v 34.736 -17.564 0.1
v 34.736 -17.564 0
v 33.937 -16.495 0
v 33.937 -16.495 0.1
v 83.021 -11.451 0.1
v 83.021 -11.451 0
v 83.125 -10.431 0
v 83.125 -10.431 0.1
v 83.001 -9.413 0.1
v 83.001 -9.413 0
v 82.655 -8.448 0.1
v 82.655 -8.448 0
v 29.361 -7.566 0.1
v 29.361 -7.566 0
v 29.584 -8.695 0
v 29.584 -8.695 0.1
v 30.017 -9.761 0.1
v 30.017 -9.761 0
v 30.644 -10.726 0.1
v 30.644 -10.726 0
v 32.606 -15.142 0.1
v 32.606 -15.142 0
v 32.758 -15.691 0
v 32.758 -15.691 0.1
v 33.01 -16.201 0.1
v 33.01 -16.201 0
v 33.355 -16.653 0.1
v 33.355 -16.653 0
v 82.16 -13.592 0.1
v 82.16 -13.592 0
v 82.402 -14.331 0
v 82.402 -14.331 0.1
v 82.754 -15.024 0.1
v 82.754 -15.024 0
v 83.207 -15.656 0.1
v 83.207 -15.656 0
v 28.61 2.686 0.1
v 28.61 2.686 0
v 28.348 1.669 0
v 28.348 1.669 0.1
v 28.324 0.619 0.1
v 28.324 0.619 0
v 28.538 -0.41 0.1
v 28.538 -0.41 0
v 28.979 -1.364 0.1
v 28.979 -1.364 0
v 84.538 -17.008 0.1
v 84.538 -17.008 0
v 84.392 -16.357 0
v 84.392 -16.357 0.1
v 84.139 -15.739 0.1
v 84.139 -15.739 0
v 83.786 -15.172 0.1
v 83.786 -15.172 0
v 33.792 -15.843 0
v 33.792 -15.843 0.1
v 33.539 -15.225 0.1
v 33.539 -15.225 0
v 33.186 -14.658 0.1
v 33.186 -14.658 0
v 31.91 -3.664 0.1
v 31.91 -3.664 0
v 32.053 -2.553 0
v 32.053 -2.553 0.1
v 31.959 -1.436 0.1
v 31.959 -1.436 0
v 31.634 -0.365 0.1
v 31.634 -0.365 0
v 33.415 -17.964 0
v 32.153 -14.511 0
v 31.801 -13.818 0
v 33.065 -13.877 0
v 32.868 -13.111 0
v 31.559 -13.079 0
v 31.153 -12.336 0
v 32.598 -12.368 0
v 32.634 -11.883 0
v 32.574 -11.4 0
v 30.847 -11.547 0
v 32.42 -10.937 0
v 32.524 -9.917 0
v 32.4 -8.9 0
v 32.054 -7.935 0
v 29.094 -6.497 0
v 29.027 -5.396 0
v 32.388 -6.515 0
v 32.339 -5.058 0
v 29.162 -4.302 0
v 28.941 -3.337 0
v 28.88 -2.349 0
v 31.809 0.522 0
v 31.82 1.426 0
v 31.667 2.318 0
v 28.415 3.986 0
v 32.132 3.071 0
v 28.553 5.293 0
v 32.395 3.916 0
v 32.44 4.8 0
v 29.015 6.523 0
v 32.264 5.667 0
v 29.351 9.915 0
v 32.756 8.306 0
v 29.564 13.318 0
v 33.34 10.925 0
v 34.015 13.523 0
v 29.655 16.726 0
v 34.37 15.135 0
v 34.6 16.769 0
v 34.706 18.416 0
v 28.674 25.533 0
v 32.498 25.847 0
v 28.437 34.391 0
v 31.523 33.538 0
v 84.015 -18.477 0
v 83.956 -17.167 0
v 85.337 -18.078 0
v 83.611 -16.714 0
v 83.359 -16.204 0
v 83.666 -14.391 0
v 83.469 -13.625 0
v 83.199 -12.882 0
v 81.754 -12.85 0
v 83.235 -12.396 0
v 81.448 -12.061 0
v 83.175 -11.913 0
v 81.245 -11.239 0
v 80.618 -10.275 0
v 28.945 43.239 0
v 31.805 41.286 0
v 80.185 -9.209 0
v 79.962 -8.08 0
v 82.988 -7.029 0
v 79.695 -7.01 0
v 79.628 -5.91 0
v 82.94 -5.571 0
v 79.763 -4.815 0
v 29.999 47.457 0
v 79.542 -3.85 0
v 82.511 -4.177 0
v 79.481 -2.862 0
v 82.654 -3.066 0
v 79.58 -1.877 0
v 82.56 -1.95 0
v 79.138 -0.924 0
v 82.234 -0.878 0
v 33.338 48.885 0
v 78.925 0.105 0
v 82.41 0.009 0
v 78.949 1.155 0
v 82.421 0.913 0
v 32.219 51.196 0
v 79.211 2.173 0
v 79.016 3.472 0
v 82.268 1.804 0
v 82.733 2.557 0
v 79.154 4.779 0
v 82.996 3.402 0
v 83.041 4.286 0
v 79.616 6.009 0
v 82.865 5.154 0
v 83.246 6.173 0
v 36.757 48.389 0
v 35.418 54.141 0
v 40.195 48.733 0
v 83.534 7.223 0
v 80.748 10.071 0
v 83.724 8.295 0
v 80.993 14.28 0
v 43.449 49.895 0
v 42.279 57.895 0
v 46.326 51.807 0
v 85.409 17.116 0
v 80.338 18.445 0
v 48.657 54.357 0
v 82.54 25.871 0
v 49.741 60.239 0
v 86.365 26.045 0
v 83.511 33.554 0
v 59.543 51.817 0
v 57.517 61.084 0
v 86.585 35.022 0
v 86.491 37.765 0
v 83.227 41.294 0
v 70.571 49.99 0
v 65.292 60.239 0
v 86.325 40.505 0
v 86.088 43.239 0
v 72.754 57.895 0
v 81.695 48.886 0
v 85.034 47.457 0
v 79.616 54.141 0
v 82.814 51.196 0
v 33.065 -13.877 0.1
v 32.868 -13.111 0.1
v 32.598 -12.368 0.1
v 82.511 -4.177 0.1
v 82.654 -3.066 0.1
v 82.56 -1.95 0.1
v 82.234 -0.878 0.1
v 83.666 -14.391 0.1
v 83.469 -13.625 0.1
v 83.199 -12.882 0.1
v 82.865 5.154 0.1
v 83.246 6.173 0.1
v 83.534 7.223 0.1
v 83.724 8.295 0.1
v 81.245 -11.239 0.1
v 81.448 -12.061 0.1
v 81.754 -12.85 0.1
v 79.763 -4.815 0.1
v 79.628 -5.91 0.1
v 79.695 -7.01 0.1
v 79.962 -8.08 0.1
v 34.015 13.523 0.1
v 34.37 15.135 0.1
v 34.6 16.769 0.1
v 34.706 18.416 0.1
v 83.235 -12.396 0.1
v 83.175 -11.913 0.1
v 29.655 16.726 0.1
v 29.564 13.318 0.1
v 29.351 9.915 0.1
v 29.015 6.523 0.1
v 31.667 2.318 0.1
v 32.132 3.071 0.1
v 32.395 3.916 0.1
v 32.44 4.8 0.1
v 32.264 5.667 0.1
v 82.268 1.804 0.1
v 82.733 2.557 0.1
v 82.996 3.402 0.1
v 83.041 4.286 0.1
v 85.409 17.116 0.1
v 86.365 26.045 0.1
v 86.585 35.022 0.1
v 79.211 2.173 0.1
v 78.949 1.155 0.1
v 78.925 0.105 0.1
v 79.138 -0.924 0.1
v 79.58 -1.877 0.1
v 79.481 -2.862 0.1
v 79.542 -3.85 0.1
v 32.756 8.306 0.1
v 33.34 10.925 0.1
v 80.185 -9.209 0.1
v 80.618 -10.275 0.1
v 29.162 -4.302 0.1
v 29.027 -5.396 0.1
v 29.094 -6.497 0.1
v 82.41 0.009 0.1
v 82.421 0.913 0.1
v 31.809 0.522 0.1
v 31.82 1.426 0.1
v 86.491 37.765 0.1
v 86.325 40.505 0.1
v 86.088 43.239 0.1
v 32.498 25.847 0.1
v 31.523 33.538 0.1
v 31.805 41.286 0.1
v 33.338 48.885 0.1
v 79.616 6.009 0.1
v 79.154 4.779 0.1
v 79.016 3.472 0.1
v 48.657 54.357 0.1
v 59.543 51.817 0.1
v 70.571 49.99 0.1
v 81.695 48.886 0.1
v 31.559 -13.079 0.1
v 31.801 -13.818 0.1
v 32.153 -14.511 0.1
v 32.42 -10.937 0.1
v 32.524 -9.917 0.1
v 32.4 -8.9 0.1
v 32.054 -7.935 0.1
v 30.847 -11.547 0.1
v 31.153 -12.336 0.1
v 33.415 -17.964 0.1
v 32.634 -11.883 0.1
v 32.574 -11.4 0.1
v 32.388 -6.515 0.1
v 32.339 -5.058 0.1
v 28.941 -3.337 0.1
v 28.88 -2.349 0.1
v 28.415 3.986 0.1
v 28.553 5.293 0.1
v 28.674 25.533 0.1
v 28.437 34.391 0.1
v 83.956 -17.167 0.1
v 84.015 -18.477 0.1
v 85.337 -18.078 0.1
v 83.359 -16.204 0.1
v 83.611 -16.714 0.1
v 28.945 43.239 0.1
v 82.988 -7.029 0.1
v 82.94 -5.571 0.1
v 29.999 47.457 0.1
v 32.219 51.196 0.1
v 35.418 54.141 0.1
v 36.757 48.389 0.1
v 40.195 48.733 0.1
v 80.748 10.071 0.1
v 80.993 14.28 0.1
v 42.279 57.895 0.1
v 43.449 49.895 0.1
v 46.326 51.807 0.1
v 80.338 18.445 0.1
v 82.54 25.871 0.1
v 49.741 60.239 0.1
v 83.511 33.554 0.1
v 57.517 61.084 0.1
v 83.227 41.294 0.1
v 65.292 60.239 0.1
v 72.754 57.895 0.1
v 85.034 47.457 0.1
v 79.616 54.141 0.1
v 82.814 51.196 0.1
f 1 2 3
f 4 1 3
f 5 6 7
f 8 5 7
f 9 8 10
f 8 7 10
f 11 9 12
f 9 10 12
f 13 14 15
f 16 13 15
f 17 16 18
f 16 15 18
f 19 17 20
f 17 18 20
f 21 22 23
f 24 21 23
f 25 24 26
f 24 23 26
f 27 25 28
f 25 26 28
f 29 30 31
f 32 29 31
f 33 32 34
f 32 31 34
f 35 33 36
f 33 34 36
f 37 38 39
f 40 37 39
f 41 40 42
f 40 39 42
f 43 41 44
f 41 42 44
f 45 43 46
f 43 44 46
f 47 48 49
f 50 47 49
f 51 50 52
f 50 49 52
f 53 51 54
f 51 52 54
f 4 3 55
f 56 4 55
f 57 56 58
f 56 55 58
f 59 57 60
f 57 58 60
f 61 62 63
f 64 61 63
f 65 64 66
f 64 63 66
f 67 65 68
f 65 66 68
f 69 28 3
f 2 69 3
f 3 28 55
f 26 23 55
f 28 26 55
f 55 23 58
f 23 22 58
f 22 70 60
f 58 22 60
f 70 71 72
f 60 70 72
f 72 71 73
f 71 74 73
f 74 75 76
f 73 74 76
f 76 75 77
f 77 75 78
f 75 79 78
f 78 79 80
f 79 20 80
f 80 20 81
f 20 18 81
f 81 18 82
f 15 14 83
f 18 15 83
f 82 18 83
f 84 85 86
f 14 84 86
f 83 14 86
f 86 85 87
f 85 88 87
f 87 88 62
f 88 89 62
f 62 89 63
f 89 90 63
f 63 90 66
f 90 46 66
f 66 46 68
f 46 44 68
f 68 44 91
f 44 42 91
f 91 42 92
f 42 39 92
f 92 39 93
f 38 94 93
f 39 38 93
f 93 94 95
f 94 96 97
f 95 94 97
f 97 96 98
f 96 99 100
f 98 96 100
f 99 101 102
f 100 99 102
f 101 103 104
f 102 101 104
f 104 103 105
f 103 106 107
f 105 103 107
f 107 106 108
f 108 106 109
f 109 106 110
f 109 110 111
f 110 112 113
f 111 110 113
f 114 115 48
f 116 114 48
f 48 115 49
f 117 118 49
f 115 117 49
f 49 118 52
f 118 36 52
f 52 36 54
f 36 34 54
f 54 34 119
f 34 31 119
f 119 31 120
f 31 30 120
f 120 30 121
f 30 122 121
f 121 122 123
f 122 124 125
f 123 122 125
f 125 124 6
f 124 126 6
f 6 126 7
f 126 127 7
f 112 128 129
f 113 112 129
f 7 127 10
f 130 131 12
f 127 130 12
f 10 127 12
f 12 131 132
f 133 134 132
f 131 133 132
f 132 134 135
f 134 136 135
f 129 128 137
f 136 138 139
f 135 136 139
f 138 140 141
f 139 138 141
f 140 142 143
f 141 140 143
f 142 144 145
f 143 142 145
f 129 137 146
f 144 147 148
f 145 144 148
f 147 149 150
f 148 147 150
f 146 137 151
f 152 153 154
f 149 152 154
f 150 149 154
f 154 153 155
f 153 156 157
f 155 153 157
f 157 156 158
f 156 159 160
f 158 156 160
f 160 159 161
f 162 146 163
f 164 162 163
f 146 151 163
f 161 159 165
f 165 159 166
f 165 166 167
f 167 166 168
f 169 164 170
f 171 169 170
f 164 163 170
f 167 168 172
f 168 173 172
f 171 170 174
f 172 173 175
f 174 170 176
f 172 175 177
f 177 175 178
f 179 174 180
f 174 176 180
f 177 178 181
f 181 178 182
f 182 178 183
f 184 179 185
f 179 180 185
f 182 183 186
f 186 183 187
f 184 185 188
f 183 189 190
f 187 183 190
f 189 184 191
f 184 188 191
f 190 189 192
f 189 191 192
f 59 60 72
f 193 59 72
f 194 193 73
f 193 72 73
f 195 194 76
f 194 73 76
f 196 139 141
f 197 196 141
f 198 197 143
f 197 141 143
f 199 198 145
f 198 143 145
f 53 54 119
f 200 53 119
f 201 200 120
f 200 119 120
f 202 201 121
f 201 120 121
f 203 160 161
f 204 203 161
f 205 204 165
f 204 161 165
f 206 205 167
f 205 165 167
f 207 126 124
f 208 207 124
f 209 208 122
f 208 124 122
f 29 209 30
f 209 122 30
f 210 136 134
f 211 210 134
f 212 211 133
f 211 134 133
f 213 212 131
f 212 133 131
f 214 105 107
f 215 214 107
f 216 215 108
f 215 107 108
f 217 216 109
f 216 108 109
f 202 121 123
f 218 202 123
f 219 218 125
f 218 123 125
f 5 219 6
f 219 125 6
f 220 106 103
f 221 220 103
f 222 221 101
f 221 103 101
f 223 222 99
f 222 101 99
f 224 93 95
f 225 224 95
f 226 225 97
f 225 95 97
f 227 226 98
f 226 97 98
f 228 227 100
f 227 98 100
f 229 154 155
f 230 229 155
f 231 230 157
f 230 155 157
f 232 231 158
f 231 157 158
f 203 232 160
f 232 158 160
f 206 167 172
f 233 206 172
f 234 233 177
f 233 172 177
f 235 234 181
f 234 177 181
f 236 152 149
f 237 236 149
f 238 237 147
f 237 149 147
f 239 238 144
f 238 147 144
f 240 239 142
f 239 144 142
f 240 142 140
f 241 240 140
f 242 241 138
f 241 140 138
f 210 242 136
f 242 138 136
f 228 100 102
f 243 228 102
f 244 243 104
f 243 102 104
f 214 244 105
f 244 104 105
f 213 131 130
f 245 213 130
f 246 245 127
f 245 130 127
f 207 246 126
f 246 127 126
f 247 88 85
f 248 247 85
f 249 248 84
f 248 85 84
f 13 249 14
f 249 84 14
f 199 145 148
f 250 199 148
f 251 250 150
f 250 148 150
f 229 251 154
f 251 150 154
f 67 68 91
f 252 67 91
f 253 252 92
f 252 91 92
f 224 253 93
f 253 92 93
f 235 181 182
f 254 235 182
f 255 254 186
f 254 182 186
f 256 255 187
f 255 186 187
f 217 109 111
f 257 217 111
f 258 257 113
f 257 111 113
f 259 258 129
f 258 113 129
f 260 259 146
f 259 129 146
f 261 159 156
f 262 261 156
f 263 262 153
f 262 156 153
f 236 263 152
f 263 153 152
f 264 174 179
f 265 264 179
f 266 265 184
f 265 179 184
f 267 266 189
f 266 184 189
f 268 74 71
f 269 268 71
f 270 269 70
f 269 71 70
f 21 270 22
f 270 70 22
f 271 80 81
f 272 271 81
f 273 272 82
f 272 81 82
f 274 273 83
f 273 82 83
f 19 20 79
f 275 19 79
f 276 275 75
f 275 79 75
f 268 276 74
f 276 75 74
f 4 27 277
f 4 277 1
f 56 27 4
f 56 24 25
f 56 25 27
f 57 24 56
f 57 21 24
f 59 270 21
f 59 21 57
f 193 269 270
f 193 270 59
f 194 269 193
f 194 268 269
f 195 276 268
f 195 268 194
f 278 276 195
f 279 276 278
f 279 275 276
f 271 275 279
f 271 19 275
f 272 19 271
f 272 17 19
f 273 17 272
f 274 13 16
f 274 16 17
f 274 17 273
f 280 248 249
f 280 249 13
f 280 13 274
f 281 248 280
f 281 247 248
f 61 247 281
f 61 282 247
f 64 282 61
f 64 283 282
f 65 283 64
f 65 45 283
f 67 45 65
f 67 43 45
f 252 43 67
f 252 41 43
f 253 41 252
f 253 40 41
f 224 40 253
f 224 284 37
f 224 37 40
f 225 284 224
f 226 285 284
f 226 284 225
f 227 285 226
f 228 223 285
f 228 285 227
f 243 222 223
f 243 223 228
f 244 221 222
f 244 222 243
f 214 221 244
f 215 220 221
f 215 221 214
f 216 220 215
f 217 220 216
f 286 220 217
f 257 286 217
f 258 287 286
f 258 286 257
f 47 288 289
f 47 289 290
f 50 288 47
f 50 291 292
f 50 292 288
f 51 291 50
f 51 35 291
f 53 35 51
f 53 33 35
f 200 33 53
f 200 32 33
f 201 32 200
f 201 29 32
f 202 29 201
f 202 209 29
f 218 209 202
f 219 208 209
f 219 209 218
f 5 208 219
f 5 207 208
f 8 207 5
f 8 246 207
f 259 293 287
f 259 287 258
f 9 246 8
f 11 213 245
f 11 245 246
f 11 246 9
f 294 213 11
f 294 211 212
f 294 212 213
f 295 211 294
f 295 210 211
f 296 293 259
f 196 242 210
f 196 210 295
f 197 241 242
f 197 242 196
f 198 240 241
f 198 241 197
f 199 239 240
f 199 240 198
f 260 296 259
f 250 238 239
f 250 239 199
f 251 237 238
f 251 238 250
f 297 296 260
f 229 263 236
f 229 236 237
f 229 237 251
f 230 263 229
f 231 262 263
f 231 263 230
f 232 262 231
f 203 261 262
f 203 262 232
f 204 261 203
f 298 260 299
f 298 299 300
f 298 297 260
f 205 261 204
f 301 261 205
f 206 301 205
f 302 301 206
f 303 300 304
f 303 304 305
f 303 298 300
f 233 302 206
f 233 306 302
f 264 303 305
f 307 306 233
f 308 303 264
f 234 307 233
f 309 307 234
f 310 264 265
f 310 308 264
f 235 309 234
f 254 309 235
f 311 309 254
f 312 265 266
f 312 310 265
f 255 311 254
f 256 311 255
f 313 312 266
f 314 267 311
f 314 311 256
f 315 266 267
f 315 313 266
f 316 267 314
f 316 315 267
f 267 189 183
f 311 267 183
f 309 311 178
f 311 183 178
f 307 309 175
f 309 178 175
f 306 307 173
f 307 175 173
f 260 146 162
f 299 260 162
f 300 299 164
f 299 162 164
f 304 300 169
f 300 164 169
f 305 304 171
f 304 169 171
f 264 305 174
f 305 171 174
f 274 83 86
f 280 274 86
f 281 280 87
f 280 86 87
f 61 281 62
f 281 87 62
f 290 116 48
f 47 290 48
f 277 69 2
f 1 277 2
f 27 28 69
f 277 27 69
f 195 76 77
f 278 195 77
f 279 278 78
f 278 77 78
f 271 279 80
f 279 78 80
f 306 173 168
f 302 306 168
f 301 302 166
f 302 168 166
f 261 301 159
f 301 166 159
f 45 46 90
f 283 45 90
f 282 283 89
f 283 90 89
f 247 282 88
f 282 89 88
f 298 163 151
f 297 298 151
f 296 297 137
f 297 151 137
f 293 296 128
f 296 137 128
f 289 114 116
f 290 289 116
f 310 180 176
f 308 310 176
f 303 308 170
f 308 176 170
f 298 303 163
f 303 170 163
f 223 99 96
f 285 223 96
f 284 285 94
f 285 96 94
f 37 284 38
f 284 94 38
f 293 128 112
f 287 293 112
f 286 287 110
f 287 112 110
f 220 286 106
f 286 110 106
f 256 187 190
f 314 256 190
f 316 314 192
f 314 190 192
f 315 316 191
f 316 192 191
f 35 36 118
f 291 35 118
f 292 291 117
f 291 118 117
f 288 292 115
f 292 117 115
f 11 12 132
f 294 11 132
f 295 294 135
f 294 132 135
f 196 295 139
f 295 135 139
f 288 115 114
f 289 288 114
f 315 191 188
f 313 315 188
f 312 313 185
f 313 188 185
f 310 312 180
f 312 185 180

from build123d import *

# Parameters (mm, degrees)
SALIENTE_EXTRUIR1_DEPTH = 0.1


with BuildPart() as part:
    # Model → Saliente-Extruir1 (new body)
    with BuildSketch(Plane.XY):
        with BuildLine():
            Line((83.956301506, -17.166999348), (84.015376633, -18.477240051))
            Line((84.015376633, -18.477240051), (85.336602283, -18.077638007))
            Line((85.336602283, -18.077638007), (84.538223467, -17.008293358))
            ThreePointArc((84.538223467, -17.008293358), (84.278969465, -16.042382101), (83.786477348, -15.171951914))
            ThreePointArc((83.786477348, -15.171951914), (83.576571308, -14.005422888), (83.198659759, -12.8820203))
            ThreePointArc((83.198659759, -12.8820203), (83.21653602, -12.153238047), (83.021147285, -11.450908798))
            ThreePointArc((83.021147285, -11.450908798), (83.091174716, -9.918606089), (82.654557847, -8.448156791))
            ThreePointArc((82.654557847, -8.448156791), (83.012265392, -6.298296984), (82.511107342, -4.177284848))
            ThreePointArc((82.511107342, -4.177284848), (82.63621748, -2.505599358), (82.234450021, -0.878095799))
            ThreePointArc((82.234450021, -0.878095799), (82.435913685, 0.460640045), (82.268030876, 1.804000246))
            ThreePointArc((82.268030876, 1.804000246), (82.996051805, 3.402356573), (82.865109648, 5.153816414))
            ThreePointArc((82.865109648, 5.153816414), (83.401985842, 6.694986621), (83.724308061, 8.294846004))
            ThreePointArc((83.724308061, 8.294846004), (85.978479306, 21.570456798), (86.584690484, 35.022432042))
            ThreePointArc((86.584690484, 35.022432042), (86.416684054, 39.135370857), (86.088155048, 43.23860867))
            ThreePointArc((86.088155048, 43.23860867), (84.060345255, 49.407216919), (79.615503089, 54.140832704))
            ThreePointArc((79.615503089, 54.140832704), (69.080555659, 59.249963441), (57.51663409, 61.084098716))
            ThreePointArc((57.51663409, 61.084098716), (45.952712521, 59.249963441), (35.417765091, 54.140832704))
            ThreePointArc((35.417765091, 54.140832704), (30.972922925, 49.407216919), (28.945113132, 43.23860867))
            ThreePointArc((28.945113132, 43.23860867), (28.46242928, 29.95974371), (29.654838805, 16.72571946))
            ThreePointArc((29.654838805, 16.72571946), (29.473058184, 11.615593771), (29.015376633, 6.522759949))
            ThreePointArc((29.015376633, 6.522759949), (28.442846773, 4.643578134), (28.610136964, 2.6862512))
            ThreePointArc((28.610136964, 2.6862512), (28.323722373, 0.618533481), (28.978689788, -1.363512826))
            ThreePointArc((28.978689788, -1.363512826), (28.890519119, -2.843965116), (29.162248311, -4.30193504))
            ThreePointArc((29.162248311, -4.30193504), (29.034928035, -5.947952582), (29.360669993, -7.566432232))
            ThreePointArc((29.360669993, -7.566432232), (29.77476773, -9.238513166), (30.644216328, -10.725587717))
            ThreePointArc((30.644216328, -10.725587717), (30.987352099, -11.946605577), (31.558807946, -13.078888662))
            ThreePointArc((31.558807946, -13.078888662), (31.963393581, -14.170963904), (32.606401809, -15.141972807))
            ThreePointArc((32.606401809, -15.141972807), (32.871834994, -15.95176655), (33.355447957, -16.653435407))
            Line((33.355447957, -16.653435407), (33.414523084, -17.96367611))
            Line((33.414523084, -17.96367611), (34.735748735, -17.564074065))
            Line((34.735748735, -17.564074065), (33.937369918, -16.494729417))
            ThreePointArc((33.937369918, -16.494729417), (33.678115916, -15.52881816), (33.185623799, -14.658387973))
            ThreePointArc((33.185623799, -14.658387973), (32.97571776, -13.491858947), (32.59780621, -12.368456359))
            ThreePointArc((32.59780621, -12.368456359), (32.615682471, -11.639674106), (32.420293737, -10.937344857))
            ThreePointArc((32.420293737, -10.937344857), (32.490321167, -9.405042148), (32.053704298, -7.93459285))
            ThreePointArc((32.053704298, -7.93459285), (32.411411843, -5.784733043), (31.910253793, -3.663720907))
            ThreePointArc((31.910253793, -3.663720907), (32.035363932, -1.992035417), (31.633596472, -0.364531858))
            ThreePointArc((31.633596472, -0.364531858), (31.835060136, 0.974203986), (31.667177327, 2.317564187))
            ThreePointArc((31.667177327, 2.317564187), (32.395198256, 3.915920514), (32.2642561, 5.667380355))
            ThreePointArc((32.2642561, 5.667380355), (33.036563223, 9.618087334), (34.015376633, 13.522759949))
            ThreePointArc((34.015376633, 13.522759949), (34.500457554, 15.949651286), (34.706334447, 18.41596833))
            ThreePointArc((34.706334447, 18.41596833), (31.522529085, 33.538428771), (33.337993753, 48.885399624))
            ThreePointArc((33.337993753, 48.885399624), (41.857208532, 49.214409123), (48.657173595, 54.356951572))
            ThreePointArc((48.657173595, 54.356951572), (65.042417717, 50.813818289), (81.695137016, 48.885876802))
            ThreePointArc((81.695137016, 48.885876802), (83.511455819, 33.554448429), (80.338345767, 18.445408666))
            ThreePointArc((80.338345767, 18.445408666), (80.983262934, 12.168889843), (79.616230182, 6.009196008))
            ThreePointArc((79.616230182, 6.009196008), (79.043700322, 4.130014193), (79.210990513, 2.172687259))
            ThreePointArc((79.210990513, 2.172687259), (78.924575921, 0.10496954), (79.579543337, -1.877076767))
            ThreePointArc((79.579543337, -1.877076767), (79.491372668, -3.357529058), (79.763101859, -4.815498981))
            ThreePointArc((79.763101859, -4.815498981), (79.635781584, -6.461516523), (79.961523541, -8.079996173))
            ThreePointArc((79.961523541, -8.079996173), (80.375621279, -9.752077107), (81.245069877, -11.239151658))
            ThreePointArc((81.245069877, -11.239151658), (81.588205648, -12.460169518), (82.159661495, -13.592452603))
            ThreePointArc((82.159661495, -13.592452603), (82.56424713, -14.684527845), (83.207255358, -15.655536748))
            ThreePointArc((83.207255358, -15.655536748), (83.472688543, -16.465330491), (83.956301506, -17.166999348))
        make_face()
    extrude(amount=SALIENTE_EXTRUIR1_DEPTH)


solid = part.part
